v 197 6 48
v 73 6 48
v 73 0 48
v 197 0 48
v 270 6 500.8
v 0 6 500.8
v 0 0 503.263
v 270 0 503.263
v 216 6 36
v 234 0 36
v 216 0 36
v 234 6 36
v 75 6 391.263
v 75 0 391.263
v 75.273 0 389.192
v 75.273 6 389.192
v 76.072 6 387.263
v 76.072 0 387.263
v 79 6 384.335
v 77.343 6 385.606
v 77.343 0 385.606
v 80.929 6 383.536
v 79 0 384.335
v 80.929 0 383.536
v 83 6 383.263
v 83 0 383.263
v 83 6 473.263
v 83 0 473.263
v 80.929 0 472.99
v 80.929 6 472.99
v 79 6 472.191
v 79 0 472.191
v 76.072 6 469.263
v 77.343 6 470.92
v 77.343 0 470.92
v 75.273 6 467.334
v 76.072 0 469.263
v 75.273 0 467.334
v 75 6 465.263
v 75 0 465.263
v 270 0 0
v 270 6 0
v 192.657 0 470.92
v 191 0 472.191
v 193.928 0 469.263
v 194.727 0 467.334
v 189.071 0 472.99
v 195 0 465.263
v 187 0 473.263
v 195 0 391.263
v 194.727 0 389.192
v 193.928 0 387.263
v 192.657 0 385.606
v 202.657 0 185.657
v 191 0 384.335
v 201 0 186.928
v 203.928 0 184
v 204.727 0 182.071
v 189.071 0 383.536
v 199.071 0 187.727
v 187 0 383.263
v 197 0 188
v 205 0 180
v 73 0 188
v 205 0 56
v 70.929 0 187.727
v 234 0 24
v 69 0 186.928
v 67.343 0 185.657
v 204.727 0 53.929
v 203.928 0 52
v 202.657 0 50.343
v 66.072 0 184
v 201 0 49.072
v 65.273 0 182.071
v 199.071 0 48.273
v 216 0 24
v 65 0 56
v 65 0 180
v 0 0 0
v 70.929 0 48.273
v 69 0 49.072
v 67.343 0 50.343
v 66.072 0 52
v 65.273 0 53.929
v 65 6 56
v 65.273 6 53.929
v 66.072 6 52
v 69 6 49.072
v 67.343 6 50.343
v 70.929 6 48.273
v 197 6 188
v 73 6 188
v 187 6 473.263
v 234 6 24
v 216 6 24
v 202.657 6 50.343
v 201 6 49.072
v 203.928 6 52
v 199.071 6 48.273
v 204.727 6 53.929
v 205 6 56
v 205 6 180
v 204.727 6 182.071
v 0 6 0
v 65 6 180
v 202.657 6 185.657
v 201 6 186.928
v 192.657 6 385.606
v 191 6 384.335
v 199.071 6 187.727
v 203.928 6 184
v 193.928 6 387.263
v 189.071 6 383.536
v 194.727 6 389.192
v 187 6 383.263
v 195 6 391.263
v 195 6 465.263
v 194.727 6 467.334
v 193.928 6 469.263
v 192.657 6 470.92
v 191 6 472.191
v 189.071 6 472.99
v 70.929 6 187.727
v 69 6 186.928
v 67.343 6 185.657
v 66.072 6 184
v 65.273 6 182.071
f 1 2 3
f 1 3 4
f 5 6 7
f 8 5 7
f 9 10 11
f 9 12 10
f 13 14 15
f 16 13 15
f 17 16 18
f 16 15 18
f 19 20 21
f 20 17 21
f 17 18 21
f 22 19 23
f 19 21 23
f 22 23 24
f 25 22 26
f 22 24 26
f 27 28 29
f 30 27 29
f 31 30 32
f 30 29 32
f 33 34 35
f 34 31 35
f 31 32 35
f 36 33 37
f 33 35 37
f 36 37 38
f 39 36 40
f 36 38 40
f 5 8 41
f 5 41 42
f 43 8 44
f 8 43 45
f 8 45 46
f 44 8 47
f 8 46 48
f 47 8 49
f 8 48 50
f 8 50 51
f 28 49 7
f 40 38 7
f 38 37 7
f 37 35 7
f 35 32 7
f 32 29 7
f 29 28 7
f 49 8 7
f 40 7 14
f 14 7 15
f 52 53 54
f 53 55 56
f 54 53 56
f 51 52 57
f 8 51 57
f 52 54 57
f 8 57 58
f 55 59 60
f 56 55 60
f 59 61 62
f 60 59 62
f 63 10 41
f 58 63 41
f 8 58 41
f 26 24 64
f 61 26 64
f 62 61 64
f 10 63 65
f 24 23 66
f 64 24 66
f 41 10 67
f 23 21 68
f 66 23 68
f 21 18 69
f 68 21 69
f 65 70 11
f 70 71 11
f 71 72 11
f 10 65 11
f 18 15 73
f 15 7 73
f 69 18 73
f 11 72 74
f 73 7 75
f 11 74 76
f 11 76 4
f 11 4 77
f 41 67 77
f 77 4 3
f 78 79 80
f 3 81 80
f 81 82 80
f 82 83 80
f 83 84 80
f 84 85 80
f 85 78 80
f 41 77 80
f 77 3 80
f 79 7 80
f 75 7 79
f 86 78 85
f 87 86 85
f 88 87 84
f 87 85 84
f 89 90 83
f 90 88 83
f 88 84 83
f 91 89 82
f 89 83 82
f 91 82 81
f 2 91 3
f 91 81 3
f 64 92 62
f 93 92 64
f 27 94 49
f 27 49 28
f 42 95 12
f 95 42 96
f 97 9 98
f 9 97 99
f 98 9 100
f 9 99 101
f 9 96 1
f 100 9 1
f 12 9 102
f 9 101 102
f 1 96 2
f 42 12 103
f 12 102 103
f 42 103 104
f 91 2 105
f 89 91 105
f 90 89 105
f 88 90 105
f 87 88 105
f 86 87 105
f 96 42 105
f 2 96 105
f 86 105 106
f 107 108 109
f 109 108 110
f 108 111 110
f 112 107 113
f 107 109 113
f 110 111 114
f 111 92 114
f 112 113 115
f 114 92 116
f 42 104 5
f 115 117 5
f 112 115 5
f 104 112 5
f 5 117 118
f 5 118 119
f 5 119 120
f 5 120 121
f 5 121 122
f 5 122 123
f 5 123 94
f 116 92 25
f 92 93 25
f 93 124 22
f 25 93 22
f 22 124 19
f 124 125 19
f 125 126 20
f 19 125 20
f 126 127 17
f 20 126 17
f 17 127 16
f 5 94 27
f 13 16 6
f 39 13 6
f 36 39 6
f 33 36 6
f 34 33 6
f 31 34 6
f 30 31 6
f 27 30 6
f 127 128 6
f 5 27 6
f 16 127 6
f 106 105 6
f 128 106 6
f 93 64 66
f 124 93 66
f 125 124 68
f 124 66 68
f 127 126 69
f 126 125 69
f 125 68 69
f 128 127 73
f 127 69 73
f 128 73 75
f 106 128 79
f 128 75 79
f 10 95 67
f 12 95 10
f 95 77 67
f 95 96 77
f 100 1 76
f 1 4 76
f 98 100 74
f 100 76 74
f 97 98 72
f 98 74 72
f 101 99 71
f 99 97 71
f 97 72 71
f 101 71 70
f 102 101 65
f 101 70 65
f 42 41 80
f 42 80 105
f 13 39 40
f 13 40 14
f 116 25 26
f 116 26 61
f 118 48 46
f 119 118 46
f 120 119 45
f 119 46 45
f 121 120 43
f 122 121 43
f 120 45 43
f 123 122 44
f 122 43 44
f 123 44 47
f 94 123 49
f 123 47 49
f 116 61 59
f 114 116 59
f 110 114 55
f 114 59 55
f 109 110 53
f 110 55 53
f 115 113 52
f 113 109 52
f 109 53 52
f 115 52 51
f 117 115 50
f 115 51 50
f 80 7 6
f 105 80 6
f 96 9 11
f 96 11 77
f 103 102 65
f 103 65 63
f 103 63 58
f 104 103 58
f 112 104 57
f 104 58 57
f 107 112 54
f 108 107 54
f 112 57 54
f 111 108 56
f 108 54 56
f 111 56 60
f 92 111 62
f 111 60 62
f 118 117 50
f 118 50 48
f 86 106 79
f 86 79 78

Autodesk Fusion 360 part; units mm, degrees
sketch "Back Panel" plane through (0, 0, 0) normal (1, 0, 0) x (0, 1, 0)
  line L0 (0, 0) -> (6, 0)
  line L1 (6, 0) -> (6, 500.8)
  line L2 (0, 500.8) -> (0, 0)
  line L3 (0, 500.8) -> (0, 503.263)
  line L4 (6, 500.8) -> (0, 503.263)
  dimension "d8" = 6
  dimension "d9" = 500.8
  dimension "d10" = 2.463
  dimension "d11" = 112.318
extrude "Extrude2" add sketch "Back Panel" along normal blind 270
sketch "Switch Hole" plane through (0, 6, 0) normal (0, 1, 0) x (-1, 0, 0)
  line L0 (0, 0) -> (0, 500.8)
  line L1 (0, 500.8) -> (-270, 500.8)
  line L2 (-270, 500.8) -> (-270, 0)
  line L3 (-270, 0) -> (0, 0)
  line L4 (-234, 36) -> (-216, 36)
  line L5 (-216, 36) -> (-216, 24)
  line L6 (-216, 24) -> (-234, 24)
  line L7 (-234, 24) -> (-234, 36)
  dimension "d14" = 18
  dimension "d15" = 12
  dimension "d16" = 36
  dimension "d17" = 24
extrude "Extrude3" cut sketch "Switch Hole" against normal blind 6 contours L4 L5 L6 L7
sketch "Bottom Access Panel" plane through (0, 6, 0) normal (0, 1, 0) x (-1, 0, 0)
  line L0 (-216, 36) -> (-216, 24)
  line L1 (-216, 24) -> (-234, 24)
  line L2 (-234, 24) -> (-234, 36)
  line L3 (-234, 36) -> (-216, 36)
  line L4 (0, 0) -> (0, 500.8)
  line L5 (0, 500.8) -> (-270, 500.8)
  line L6 (-270, 500.8) -> (-270, 0)
  line L7 (-270, 0) -> (0, 0)
  line L8 (-205, 188) -> (-65, 188)
  line L9 (-65, 188) -> (-65, 48)
  line L10 (-65, 48) -> (-205, 48)
  line L11 (-205, 48) -> (-205, 188)
  dimension "d20" = 48
  dimension "d21" = 65
  dimension "d22" = 65
  dimension "d28" = 140
  dimension "d29" = 140
  dimension "d30" = 24
  dimension "d31" = 12
  dimension "d32" = 12
  dimension "d33" = 188
extrude "Extrude4" cut sketch "Bottom Access Panel" against normal blind 6 contours L8 L9 L10 L11
fillet "Fillet1" radius 8 4 edges at (65, 3, 188) (65, 3, 48) (205, 3, 48) (205, 3, 188)
sketch "Top Access Panel" plane through (0, 6, 0) normal (0, 1, 0) x (-1, 0, 0)
  line L0 (-65, 180) -> (-65, 56)
  arc A0 (-73, 48) -> (-65, 56) centre (-73, 56) ccw
  line L1 (-73, 48) -> (-197, 48)
  arc A1 (-205, 56) -> (-197, 48) centre (-197, 56) ccw
  line L2 (-205, 56) -> (-205, 180)
  arc A2 (-197, 188) -> (-205, 180) centre (-197, 180) ccw
  line L3 (-197, 188) -> (-73, 188)
  arc A3 (-65, 180) -> (-73, 188) centre (-73, 180) ccw
  line L4 (-216, 36) -> (-216, 24)
  line L5 (-216, 24) -> (-234, 24)
  line L6 (-234, 24) -> (-234, 36)
  line L7 (-234, 36) -> (-216, 36)
  line L8 (0, 0) -> (0, 500.8)
  line L9 (0, 500.8) -> (-270, 500.8)
  line L10 (-270, 500.8) -> (-270, 0)
  line L11 (-270, 0) -> (0, 0)
  line L12 (-195, 473.263) -> (-75, 473.263)
  line L13 (-75, 473.263) -> (-75, 383.263)
  line L14 (-75, 383.263) -> (-195, 383.263)
  line L15 (-195, 383.263) -> (-195, 473.263)
  line L16 (-180, 473.263) -> (-90, 473.263)
  line L17 (0, 503.263) -> (-270, 503.263)
  dimension "d34" = 120
  dimension "d35" = 140
  dimension "d36" = 75
  dimension "d37" = 75
  dimension "d38" = 65
  dimension "d39" = 65
  dimension "d45" = 90
  dimension "d49" = 30
extrude "Extrude5" cut sketch "Top Access Panel" against normal blind 6 contours L12 L13 L14 L15 L16
fillet "Fillet2" radius 8 4 edges at (75, 3, 473.263) (195, 3, 473.263) (195, 3, 383.263) (75, 3, 383.263)
equation "MDFThickness = 6 mm" comment "Thickness of the MDF board"
equation "d16 = ( 18 * 2 ) * 1 mm"
equation "d17 = ( 12 * 2 ) * 1 mm"
equation "d18 = -MDFThickness"
equation "d23 = -MDFThickness"
equation "filletRadius = 8 mm" comment "Radius to use for fillets"
equation "d27 = filletRadius"
equation "d36 = ( ( 270 - 120 ) / 2 ) * 1 mm"
equation "d51 = -MDFThickness"
equation "d54 = filletRadius"
